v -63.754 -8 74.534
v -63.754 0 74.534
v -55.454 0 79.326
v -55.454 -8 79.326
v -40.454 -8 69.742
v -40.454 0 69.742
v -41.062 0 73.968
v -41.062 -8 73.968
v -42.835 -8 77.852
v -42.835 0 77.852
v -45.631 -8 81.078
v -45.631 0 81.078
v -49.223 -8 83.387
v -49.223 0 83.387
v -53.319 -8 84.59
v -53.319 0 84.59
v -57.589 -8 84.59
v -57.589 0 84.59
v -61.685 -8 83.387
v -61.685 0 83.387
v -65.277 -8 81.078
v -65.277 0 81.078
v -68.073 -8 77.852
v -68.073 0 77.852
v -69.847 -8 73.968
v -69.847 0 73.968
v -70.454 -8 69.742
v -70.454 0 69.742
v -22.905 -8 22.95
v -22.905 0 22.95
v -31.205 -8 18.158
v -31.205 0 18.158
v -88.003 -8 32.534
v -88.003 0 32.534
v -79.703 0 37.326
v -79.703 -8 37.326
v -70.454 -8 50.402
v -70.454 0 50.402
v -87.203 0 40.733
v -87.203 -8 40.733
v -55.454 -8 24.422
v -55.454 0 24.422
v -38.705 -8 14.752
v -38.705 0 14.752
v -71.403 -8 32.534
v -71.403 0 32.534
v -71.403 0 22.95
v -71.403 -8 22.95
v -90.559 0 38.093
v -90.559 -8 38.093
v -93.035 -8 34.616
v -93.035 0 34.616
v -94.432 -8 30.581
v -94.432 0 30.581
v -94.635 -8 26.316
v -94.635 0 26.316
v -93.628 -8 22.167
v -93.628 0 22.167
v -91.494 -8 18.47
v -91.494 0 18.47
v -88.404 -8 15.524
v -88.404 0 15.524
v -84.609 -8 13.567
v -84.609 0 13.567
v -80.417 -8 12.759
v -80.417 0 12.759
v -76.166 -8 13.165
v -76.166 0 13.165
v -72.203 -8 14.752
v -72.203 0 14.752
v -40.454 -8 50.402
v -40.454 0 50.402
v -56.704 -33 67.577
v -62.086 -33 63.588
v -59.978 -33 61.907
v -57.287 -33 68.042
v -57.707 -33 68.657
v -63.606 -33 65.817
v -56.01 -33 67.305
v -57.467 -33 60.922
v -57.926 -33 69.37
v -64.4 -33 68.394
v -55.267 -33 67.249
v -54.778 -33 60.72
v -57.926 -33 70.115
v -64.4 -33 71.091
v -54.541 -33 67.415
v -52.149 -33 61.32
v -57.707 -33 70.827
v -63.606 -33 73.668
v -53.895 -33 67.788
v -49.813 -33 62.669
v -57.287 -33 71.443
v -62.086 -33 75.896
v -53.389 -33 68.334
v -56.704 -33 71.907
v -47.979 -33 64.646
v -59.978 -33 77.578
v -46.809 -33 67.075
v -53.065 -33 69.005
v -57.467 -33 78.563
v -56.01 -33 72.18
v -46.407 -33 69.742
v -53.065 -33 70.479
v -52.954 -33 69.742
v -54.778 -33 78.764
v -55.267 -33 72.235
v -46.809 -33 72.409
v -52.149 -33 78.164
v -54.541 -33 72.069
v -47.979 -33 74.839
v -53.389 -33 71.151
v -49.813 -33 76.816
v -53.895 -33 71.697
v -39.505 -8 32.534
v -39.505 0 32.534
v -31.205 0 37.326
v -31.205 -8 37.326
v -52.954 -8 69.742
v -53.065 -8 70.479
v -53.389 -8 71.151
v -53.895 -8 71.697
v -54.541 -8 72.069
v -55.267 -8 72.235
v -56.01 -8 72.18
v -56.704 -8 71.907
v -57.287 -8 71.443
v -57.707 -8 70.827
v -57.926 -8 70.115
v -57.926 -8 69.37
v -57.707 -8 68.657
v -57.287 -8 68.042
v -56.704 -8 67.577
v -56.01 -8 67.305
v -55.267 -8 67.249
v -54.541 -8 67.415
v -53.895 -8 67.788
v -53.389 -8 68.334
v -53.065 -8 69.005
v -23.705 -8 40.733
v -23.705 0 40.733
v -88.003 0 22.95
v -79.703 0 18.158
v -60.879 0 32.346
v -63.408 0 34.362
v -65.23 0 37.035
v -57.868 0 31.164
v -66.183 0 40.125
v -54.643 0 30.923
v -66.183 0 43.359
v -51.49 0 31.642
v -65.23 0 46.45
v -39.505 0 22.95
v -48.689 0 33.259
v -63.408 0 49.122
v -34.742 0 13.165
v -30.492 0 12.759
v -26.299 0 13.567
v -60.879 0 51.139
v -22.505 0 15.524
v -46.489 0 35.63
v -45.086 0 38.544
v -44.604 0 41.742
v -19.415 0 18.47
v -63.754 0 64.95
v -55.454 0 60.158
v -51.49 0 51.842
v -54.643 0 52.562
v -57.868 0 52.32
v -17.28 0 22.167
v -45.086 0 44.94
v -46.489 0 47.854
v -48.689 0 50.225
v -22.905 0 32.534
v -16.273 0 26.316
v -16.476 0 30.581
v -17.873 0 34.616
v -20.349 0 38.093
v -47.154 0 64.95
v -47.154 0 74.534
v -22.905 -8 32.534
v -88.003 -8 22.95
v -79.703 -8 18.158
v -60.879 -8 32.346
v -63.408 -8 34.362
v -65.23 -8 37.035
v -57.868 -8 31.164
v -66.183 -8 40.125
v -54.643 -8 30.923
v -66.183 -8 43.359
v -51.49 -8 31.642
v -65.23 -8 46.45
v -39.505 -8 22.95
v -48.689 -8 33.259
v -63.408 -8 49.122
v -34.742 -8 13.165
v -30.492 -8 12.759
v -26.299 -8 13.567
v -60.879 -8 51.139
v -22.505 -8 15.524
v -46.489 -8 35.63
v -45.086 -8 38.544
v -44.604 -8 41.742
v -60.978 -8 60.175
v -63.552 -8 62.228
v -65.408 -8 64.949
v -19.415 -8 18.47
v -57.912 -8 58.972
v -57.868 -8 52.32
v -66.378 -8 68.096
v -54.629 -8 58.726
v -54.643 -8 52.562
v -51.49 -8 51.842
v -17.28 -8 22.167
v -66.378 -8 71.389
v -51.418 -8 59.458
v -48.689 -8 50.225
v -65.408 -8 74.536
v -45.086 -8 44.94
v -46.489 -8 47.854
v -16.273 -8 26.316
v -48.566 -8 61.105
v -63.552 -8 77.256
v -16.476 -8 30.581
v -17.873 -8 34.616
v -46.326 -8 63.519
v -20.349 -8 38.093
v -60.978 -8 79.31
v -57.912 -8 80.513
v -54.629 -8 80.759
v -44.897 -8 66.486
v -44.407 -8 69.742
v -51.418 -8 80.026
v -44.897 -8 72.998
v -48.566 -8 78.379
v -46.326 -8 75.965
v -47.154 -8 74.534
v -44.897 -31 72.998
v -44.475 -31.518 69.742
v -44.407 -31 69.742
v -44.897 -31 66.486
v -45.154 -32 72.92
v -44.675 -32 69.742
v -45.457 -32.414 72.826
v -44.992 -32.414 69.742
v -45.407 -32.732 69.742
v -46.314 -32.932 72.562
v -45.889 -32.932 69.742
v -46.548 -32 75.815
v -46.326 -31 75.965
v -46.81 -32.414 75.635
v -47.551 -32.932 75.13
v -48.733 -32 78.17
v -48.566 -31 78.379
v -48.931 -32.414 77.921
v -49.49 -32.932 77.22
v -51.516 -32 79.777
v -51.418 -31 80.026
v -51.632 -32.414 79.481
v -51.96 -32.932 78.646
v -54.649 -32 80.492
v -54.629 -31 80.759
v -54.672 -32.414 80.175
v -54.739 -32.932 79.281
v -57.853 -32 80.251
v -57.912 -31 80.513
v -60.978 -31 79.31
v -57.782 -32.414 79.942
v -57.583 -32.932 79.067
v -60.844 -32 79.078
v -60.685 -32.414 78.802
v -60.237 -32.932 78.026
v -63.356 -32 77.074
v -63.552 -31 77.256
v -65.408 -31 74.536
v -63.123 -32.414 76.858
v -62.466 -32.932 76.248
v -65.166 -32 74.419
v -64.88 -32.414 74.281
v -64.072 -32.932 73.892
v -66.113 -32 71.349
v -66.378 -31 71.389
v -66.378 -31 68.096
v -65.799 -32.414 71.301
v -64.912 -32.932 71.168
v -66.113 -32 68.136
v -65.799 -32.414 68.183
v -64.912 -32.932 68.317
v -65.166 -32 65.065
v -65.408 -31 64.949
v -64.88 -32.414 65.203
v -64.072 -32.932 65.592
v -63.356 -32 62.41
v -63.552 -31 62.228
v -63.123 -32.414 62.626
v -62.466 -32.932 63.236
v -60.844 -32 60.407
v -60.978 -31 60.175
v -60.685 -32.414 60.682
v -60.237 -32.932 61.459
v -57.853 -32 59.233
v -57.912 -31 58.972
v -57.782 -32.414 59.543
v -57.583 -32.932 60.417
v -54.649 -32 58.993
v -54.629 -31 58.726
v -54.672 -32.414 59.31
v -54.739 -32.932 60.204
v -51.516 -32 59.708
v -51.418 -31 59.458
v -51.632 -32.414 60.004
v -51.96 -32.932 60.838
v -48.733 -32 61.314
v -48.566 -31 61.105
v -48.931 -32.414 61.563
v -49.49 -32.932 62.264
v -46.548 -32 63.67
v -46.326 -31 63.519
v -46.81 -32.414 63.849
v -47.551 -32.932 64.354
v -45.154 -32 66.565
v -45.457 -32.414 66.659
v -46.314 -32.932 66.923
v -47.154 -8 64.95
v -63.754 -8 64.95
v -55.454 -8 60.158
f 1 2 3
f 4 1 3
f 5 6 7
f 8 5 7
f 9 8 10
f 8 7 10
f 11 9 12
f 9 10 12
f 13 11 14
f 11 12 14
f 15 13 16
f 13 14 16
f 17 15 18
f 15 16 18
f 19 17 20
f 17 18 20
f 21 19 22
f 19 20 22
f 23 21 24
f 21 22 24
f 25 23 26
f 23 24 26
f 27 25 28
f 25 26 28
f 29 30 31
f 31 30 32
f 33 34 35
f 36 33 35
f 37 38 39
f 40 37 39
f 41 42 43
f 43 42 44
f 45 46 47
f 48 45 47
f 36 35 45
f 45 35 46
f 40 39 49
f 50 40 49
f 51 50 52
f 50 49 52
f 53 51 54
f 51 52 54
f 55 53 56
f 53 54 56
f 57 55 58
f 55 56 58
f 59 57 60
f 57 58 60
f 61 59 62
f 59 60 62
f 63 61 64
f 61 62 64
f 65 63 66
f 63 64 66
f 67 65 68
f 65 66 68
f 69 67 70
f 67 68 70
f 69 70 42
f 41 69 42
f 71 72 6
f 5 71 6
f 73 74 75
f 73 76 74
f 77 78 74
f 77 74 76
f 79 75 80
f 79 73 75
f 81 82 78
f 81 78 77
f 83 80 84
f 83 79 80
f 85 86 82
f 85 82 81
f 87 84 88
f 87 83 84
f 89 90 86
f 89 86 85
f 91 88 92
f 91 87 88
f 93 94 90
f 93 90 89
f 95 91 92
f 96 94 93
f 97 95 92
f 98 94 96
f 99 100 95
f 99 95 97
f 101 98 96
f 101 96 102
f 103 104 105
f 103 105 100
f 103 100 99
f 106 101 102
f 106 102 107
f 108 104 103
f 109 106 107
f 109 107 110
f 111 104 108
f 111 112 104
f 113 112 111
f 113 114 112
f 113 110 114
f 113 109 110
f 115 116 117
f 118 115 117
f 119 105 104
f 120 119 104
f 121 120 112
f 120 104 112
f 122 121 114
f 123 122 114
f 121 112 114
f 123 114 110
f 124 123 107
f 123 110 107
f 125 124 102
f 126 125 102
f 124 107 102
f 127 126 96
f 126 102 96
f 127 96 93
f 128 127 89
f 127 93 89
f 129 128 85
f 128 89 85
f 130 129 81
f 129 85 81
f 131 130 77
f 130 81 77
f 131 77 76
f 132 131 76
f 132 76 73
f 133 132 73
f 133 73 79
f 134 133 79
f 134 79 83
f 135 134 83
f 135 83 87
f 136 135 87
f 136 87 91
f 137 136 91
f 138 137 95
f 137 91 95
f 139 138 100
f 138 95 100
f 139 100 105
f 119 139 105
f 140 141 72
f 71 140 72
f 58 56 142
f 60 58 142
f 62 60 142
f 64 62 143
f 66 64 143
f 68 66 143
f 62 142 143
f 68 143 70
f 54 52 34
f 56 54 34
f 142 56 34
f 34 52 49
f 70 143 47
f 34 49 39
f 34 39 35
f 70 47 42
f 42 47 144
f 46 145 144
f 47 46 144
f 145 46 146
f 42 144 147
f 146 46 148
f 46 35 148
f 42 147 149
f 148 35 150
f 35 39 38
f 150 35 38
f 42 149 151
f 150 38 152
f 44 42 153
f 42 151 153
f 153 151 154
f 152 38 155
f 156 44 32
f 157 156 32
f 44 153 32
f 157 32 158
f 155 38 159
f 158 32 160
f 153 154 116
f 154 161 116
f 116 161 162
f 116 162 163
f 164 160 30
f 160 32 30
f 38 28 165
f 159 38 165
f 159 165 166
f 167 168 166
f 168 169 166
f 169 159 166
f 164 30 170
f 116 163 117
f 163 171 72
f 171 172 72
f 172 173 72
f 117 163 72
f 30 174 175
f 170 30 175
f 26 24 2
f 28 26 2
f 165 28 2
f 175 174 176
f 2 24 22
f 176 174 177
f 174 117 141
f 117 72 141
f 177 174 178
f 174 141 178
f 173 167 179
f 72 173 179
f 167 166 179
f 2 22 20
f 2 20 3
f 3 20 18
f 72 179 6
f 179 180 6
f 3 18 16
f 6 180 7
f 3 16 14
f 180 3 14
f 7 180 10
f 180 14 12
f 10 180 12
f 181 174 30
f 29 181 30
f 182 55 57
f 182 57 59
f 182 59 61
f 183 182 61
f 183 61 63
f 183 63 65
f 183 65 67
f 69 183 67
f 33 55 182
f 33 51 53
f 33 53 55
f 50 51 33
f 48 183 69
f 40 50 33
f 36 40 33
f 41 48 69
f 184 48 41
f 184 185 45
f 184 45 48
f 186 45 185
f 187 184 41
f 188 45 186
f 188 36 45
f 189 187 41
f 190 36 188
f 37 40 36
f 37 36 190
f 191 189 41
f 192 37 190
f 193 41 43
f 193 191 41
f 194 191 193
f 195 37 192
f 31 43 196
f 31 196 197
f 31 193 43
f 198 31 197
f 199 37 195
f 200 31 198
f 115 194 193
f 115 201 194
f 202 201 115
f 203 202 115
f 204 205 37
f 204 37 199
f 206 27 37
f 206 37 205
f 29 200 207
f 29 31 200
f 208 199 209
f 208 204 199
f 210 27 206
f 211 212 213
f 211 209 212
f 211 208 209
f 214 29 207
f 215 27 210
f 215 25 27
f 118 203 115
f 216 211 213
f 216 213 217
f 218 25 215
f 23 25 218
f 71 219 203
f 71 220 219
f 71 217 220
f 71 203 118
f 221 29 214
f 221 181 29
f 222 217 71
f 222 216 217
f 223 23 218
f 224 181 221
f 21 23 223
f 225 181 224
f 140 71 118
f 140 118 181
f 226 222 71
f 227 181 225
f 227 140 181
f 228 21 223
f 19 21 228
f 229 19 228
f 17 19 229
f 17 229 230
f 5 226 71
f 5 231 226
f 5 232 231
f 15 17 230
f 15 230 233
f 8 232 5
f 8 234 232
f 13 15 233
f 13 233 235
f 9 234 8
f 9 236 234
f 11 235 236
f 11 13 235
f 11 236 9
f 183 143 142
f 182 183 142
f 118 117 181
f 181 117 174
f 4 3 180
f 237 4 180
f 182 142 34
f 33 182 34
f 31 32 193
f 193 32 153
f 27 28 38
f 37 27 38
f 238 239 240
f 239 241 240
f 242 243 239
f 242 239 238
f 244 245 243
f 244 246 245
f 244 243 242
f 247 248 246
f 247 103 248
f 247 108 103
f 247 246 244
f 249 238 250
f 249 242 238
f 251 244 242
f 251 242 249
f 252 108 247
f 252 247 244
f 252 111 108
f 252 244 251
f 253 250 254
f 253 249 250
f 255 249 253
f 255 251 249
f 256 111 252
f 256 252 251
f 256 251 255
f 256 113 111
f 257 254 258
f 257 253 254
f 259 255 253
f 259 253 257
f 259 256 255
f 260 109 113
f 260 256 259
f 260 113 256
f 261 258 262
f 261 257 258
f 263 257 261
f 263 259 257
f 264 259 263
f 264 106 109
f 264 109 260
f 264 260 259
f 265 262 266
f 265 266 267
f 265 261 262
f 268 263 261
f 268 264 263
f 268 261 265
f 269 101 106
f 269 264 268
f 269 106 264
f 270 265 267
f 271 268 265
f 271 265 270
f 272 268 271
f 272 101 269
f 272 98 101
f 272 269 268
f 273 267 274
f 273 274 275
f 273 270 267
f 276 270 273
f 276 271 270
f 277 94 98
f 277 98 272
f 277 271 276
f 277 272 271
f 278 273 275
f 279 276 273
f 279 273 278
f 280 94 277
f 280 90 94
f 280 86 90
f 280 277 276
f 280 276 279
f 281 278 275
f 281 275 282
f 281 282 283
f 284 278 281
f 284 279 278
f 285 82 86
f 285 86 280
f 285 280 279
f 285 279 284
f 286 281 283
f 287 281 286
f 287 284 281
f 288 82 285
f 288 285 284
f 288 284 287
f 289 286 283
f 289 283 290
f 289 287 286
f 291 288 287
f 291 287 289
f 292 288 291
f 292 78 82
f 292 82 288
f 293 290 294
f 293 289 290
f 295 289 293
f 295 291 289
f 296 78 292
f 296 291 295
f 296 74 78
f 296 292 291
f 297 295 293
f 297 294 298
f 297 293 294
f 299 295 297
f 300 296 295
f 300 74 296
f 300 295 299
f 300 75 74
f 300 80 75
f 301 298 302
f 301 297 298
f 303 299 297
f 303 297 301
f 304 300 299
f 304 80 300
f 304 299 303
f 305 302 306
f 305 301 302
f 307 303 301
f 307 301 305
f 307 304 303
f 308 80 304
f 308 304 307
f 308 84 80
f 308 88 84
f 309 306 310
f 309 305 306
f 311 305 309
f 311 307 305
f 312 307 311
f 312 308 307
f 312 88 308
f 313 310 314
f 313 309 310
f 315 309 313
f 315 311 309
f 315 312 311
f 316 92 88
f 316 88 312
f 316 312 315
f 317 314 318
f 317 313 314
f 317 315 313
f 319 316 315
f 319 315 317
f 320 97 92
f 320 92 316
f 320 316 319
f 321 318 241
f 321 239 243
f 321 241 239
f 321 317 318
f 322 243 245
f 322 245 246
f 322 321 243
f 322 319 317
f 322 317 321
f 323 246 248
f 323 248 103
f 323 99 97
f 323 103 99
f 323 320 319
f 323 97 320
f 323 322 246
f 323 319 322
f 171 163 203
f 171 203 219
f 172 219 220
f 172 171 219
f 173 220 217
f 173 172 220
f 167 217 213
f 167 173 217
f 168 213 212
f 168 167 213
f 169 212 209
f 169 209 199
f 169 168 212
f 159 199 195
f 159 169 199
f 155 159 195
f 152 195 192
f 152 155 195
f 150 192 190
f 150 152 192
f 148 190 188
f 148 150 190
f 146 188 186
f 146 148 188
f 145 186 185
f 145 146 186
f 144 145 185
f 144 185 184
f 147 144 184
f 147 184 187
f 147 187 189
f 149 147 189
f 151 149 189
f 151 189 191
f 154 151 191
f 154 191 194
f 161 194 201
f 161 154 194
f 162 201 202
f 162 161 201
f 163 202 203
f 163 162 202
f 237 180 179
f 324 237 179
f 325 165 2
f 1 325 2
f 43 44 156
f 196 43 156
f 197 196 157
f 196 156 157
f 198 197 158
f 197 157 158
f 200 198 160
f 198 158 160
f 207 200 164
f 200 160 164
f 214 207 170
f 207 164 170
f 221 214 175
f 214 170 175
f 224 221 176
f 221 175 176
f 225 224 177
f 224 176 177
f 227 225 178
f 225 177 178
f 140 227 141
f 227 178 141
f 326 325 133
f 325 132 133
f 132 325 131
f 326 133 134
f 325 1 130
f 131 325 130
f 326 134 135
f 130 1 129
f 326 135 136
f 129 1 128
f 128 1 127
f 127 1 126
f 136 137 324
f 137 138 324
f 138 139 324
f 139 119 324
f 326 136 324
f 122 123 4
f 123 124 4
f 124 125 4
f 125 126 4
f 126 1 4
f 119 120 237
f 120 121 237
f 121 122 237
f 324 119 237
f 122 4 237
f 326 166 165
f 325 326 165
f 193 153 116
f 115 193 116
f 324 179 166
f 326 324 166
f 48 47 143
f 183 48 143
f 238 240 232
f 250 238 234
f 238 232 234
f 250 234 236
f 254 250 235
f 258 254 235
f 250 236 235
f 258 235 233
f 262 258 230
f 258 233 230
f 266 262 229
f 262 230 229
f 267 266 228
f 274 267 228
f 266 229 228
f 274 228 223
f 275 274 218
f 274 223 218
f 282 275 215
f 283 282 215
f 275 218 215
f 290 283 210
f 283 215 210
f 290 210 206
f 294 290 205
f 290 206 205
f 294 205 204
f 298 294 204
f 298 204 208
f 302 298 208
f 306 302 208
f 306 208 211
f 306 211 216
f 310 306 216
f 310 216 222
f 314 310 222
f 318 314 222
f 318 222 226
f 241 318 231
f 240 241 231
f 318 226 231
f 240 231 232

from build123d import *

# Parameters (mm, degrees)
F0_R     = 10.85
F1_DEPTH = 8
F2_R     = 11.047434
F3_DEPTH = 25
F4_R     = 2
F5_R     = 2.5
F6_DEPTH = 25


with BuildPart() as f1:
    # F0 (on Front) → F1 (new body)
    with BuildSketch(Plane.XZ):
        with BuildLine():
            Line((-40.454113, 50.402456), (-40.454113, 69.742202))
            ThreePointArc((-40.454113, 69.742202), (-55.454113, 84.742202), (-70.454113, 69.742202))
            Line((-70.454113, 69.742202), (-70.454113, 50.402456))
            Line((-70.454113, 50.402456), (-87.202824, 40.732583))
            ThreePointArc((-87.202824, 40.732583), (-92.693205, 20.242202), (-72.202824, 14.751821))
            Line((-72.202824, 14.751821), (-55.454113, 24.421694))
            Line((-55.454113, 24.421694), (-38.705401, 14.751821))
            ThreePointArc((-38.705401, 14.751821), (-18.21502, 20.242202), (-23.705401, 40.732583))
            Line((-23.705401, 40.732583), (-40.454113, 50.402456))
        make_face()
        Polygon((-71.402824, 32.534209), (-71.402824, 22.950195), (-79.702824, 18.158187), (-88.002824, 22.950195), (-88.002824, 32.534209), (-79.702824, 37.326216), align=None, mode=Mode.SUBTRACT)
        Polygon((-39.505401, 32.534209), (-31.205401, 37.326216), (-22.905401, 32.534209), (-22.905401, 22.950195), (-31.205401, 18.158187), (-39.505401, 22.950195), align=None, mode=Mode.SUBTRACT)
        with Locations((-55.454113, 41.742202)):
            Circle(F0_R, mode=Mode.SUBTRACT)
        Polygon((-55.454113, 79.326216), (-47.154113, 74.534209), (-47.154113, 64.950195), (-55.454113, 60.158187), (-63.754113, 64.950195), (-63.754113, 74.534209), align=None, mode=Mode.SUBTRACT)
    extrude(amount=F1_DEPTH)

    # F2 (on face) → F3 (join)
    with BuildSketch(Plane.XZ.offset(8)):
        with Locations((-55.454113, 69.742202)):
            Circle(F2_R)
    extrude(amount=F3_DEPTH)

    # F4
    f4_edges = [f1.edges().sort_by_distance(p)[0] for p in [
        (-66.501547, -33, 69.742202),
    ]]
    fillet(f4_edges, radius=F4_R)

    # F5 (on face) → F6 (cut)
    with BuildSketch(Plane.XZ.offset(33)):
        with Locations((-55.454113, 69.742202)):
            Circle(F5_R)
    extrude(amount=-F6_DEPTH, mode=Mode.SUBTRACT)


solid = f1.part
